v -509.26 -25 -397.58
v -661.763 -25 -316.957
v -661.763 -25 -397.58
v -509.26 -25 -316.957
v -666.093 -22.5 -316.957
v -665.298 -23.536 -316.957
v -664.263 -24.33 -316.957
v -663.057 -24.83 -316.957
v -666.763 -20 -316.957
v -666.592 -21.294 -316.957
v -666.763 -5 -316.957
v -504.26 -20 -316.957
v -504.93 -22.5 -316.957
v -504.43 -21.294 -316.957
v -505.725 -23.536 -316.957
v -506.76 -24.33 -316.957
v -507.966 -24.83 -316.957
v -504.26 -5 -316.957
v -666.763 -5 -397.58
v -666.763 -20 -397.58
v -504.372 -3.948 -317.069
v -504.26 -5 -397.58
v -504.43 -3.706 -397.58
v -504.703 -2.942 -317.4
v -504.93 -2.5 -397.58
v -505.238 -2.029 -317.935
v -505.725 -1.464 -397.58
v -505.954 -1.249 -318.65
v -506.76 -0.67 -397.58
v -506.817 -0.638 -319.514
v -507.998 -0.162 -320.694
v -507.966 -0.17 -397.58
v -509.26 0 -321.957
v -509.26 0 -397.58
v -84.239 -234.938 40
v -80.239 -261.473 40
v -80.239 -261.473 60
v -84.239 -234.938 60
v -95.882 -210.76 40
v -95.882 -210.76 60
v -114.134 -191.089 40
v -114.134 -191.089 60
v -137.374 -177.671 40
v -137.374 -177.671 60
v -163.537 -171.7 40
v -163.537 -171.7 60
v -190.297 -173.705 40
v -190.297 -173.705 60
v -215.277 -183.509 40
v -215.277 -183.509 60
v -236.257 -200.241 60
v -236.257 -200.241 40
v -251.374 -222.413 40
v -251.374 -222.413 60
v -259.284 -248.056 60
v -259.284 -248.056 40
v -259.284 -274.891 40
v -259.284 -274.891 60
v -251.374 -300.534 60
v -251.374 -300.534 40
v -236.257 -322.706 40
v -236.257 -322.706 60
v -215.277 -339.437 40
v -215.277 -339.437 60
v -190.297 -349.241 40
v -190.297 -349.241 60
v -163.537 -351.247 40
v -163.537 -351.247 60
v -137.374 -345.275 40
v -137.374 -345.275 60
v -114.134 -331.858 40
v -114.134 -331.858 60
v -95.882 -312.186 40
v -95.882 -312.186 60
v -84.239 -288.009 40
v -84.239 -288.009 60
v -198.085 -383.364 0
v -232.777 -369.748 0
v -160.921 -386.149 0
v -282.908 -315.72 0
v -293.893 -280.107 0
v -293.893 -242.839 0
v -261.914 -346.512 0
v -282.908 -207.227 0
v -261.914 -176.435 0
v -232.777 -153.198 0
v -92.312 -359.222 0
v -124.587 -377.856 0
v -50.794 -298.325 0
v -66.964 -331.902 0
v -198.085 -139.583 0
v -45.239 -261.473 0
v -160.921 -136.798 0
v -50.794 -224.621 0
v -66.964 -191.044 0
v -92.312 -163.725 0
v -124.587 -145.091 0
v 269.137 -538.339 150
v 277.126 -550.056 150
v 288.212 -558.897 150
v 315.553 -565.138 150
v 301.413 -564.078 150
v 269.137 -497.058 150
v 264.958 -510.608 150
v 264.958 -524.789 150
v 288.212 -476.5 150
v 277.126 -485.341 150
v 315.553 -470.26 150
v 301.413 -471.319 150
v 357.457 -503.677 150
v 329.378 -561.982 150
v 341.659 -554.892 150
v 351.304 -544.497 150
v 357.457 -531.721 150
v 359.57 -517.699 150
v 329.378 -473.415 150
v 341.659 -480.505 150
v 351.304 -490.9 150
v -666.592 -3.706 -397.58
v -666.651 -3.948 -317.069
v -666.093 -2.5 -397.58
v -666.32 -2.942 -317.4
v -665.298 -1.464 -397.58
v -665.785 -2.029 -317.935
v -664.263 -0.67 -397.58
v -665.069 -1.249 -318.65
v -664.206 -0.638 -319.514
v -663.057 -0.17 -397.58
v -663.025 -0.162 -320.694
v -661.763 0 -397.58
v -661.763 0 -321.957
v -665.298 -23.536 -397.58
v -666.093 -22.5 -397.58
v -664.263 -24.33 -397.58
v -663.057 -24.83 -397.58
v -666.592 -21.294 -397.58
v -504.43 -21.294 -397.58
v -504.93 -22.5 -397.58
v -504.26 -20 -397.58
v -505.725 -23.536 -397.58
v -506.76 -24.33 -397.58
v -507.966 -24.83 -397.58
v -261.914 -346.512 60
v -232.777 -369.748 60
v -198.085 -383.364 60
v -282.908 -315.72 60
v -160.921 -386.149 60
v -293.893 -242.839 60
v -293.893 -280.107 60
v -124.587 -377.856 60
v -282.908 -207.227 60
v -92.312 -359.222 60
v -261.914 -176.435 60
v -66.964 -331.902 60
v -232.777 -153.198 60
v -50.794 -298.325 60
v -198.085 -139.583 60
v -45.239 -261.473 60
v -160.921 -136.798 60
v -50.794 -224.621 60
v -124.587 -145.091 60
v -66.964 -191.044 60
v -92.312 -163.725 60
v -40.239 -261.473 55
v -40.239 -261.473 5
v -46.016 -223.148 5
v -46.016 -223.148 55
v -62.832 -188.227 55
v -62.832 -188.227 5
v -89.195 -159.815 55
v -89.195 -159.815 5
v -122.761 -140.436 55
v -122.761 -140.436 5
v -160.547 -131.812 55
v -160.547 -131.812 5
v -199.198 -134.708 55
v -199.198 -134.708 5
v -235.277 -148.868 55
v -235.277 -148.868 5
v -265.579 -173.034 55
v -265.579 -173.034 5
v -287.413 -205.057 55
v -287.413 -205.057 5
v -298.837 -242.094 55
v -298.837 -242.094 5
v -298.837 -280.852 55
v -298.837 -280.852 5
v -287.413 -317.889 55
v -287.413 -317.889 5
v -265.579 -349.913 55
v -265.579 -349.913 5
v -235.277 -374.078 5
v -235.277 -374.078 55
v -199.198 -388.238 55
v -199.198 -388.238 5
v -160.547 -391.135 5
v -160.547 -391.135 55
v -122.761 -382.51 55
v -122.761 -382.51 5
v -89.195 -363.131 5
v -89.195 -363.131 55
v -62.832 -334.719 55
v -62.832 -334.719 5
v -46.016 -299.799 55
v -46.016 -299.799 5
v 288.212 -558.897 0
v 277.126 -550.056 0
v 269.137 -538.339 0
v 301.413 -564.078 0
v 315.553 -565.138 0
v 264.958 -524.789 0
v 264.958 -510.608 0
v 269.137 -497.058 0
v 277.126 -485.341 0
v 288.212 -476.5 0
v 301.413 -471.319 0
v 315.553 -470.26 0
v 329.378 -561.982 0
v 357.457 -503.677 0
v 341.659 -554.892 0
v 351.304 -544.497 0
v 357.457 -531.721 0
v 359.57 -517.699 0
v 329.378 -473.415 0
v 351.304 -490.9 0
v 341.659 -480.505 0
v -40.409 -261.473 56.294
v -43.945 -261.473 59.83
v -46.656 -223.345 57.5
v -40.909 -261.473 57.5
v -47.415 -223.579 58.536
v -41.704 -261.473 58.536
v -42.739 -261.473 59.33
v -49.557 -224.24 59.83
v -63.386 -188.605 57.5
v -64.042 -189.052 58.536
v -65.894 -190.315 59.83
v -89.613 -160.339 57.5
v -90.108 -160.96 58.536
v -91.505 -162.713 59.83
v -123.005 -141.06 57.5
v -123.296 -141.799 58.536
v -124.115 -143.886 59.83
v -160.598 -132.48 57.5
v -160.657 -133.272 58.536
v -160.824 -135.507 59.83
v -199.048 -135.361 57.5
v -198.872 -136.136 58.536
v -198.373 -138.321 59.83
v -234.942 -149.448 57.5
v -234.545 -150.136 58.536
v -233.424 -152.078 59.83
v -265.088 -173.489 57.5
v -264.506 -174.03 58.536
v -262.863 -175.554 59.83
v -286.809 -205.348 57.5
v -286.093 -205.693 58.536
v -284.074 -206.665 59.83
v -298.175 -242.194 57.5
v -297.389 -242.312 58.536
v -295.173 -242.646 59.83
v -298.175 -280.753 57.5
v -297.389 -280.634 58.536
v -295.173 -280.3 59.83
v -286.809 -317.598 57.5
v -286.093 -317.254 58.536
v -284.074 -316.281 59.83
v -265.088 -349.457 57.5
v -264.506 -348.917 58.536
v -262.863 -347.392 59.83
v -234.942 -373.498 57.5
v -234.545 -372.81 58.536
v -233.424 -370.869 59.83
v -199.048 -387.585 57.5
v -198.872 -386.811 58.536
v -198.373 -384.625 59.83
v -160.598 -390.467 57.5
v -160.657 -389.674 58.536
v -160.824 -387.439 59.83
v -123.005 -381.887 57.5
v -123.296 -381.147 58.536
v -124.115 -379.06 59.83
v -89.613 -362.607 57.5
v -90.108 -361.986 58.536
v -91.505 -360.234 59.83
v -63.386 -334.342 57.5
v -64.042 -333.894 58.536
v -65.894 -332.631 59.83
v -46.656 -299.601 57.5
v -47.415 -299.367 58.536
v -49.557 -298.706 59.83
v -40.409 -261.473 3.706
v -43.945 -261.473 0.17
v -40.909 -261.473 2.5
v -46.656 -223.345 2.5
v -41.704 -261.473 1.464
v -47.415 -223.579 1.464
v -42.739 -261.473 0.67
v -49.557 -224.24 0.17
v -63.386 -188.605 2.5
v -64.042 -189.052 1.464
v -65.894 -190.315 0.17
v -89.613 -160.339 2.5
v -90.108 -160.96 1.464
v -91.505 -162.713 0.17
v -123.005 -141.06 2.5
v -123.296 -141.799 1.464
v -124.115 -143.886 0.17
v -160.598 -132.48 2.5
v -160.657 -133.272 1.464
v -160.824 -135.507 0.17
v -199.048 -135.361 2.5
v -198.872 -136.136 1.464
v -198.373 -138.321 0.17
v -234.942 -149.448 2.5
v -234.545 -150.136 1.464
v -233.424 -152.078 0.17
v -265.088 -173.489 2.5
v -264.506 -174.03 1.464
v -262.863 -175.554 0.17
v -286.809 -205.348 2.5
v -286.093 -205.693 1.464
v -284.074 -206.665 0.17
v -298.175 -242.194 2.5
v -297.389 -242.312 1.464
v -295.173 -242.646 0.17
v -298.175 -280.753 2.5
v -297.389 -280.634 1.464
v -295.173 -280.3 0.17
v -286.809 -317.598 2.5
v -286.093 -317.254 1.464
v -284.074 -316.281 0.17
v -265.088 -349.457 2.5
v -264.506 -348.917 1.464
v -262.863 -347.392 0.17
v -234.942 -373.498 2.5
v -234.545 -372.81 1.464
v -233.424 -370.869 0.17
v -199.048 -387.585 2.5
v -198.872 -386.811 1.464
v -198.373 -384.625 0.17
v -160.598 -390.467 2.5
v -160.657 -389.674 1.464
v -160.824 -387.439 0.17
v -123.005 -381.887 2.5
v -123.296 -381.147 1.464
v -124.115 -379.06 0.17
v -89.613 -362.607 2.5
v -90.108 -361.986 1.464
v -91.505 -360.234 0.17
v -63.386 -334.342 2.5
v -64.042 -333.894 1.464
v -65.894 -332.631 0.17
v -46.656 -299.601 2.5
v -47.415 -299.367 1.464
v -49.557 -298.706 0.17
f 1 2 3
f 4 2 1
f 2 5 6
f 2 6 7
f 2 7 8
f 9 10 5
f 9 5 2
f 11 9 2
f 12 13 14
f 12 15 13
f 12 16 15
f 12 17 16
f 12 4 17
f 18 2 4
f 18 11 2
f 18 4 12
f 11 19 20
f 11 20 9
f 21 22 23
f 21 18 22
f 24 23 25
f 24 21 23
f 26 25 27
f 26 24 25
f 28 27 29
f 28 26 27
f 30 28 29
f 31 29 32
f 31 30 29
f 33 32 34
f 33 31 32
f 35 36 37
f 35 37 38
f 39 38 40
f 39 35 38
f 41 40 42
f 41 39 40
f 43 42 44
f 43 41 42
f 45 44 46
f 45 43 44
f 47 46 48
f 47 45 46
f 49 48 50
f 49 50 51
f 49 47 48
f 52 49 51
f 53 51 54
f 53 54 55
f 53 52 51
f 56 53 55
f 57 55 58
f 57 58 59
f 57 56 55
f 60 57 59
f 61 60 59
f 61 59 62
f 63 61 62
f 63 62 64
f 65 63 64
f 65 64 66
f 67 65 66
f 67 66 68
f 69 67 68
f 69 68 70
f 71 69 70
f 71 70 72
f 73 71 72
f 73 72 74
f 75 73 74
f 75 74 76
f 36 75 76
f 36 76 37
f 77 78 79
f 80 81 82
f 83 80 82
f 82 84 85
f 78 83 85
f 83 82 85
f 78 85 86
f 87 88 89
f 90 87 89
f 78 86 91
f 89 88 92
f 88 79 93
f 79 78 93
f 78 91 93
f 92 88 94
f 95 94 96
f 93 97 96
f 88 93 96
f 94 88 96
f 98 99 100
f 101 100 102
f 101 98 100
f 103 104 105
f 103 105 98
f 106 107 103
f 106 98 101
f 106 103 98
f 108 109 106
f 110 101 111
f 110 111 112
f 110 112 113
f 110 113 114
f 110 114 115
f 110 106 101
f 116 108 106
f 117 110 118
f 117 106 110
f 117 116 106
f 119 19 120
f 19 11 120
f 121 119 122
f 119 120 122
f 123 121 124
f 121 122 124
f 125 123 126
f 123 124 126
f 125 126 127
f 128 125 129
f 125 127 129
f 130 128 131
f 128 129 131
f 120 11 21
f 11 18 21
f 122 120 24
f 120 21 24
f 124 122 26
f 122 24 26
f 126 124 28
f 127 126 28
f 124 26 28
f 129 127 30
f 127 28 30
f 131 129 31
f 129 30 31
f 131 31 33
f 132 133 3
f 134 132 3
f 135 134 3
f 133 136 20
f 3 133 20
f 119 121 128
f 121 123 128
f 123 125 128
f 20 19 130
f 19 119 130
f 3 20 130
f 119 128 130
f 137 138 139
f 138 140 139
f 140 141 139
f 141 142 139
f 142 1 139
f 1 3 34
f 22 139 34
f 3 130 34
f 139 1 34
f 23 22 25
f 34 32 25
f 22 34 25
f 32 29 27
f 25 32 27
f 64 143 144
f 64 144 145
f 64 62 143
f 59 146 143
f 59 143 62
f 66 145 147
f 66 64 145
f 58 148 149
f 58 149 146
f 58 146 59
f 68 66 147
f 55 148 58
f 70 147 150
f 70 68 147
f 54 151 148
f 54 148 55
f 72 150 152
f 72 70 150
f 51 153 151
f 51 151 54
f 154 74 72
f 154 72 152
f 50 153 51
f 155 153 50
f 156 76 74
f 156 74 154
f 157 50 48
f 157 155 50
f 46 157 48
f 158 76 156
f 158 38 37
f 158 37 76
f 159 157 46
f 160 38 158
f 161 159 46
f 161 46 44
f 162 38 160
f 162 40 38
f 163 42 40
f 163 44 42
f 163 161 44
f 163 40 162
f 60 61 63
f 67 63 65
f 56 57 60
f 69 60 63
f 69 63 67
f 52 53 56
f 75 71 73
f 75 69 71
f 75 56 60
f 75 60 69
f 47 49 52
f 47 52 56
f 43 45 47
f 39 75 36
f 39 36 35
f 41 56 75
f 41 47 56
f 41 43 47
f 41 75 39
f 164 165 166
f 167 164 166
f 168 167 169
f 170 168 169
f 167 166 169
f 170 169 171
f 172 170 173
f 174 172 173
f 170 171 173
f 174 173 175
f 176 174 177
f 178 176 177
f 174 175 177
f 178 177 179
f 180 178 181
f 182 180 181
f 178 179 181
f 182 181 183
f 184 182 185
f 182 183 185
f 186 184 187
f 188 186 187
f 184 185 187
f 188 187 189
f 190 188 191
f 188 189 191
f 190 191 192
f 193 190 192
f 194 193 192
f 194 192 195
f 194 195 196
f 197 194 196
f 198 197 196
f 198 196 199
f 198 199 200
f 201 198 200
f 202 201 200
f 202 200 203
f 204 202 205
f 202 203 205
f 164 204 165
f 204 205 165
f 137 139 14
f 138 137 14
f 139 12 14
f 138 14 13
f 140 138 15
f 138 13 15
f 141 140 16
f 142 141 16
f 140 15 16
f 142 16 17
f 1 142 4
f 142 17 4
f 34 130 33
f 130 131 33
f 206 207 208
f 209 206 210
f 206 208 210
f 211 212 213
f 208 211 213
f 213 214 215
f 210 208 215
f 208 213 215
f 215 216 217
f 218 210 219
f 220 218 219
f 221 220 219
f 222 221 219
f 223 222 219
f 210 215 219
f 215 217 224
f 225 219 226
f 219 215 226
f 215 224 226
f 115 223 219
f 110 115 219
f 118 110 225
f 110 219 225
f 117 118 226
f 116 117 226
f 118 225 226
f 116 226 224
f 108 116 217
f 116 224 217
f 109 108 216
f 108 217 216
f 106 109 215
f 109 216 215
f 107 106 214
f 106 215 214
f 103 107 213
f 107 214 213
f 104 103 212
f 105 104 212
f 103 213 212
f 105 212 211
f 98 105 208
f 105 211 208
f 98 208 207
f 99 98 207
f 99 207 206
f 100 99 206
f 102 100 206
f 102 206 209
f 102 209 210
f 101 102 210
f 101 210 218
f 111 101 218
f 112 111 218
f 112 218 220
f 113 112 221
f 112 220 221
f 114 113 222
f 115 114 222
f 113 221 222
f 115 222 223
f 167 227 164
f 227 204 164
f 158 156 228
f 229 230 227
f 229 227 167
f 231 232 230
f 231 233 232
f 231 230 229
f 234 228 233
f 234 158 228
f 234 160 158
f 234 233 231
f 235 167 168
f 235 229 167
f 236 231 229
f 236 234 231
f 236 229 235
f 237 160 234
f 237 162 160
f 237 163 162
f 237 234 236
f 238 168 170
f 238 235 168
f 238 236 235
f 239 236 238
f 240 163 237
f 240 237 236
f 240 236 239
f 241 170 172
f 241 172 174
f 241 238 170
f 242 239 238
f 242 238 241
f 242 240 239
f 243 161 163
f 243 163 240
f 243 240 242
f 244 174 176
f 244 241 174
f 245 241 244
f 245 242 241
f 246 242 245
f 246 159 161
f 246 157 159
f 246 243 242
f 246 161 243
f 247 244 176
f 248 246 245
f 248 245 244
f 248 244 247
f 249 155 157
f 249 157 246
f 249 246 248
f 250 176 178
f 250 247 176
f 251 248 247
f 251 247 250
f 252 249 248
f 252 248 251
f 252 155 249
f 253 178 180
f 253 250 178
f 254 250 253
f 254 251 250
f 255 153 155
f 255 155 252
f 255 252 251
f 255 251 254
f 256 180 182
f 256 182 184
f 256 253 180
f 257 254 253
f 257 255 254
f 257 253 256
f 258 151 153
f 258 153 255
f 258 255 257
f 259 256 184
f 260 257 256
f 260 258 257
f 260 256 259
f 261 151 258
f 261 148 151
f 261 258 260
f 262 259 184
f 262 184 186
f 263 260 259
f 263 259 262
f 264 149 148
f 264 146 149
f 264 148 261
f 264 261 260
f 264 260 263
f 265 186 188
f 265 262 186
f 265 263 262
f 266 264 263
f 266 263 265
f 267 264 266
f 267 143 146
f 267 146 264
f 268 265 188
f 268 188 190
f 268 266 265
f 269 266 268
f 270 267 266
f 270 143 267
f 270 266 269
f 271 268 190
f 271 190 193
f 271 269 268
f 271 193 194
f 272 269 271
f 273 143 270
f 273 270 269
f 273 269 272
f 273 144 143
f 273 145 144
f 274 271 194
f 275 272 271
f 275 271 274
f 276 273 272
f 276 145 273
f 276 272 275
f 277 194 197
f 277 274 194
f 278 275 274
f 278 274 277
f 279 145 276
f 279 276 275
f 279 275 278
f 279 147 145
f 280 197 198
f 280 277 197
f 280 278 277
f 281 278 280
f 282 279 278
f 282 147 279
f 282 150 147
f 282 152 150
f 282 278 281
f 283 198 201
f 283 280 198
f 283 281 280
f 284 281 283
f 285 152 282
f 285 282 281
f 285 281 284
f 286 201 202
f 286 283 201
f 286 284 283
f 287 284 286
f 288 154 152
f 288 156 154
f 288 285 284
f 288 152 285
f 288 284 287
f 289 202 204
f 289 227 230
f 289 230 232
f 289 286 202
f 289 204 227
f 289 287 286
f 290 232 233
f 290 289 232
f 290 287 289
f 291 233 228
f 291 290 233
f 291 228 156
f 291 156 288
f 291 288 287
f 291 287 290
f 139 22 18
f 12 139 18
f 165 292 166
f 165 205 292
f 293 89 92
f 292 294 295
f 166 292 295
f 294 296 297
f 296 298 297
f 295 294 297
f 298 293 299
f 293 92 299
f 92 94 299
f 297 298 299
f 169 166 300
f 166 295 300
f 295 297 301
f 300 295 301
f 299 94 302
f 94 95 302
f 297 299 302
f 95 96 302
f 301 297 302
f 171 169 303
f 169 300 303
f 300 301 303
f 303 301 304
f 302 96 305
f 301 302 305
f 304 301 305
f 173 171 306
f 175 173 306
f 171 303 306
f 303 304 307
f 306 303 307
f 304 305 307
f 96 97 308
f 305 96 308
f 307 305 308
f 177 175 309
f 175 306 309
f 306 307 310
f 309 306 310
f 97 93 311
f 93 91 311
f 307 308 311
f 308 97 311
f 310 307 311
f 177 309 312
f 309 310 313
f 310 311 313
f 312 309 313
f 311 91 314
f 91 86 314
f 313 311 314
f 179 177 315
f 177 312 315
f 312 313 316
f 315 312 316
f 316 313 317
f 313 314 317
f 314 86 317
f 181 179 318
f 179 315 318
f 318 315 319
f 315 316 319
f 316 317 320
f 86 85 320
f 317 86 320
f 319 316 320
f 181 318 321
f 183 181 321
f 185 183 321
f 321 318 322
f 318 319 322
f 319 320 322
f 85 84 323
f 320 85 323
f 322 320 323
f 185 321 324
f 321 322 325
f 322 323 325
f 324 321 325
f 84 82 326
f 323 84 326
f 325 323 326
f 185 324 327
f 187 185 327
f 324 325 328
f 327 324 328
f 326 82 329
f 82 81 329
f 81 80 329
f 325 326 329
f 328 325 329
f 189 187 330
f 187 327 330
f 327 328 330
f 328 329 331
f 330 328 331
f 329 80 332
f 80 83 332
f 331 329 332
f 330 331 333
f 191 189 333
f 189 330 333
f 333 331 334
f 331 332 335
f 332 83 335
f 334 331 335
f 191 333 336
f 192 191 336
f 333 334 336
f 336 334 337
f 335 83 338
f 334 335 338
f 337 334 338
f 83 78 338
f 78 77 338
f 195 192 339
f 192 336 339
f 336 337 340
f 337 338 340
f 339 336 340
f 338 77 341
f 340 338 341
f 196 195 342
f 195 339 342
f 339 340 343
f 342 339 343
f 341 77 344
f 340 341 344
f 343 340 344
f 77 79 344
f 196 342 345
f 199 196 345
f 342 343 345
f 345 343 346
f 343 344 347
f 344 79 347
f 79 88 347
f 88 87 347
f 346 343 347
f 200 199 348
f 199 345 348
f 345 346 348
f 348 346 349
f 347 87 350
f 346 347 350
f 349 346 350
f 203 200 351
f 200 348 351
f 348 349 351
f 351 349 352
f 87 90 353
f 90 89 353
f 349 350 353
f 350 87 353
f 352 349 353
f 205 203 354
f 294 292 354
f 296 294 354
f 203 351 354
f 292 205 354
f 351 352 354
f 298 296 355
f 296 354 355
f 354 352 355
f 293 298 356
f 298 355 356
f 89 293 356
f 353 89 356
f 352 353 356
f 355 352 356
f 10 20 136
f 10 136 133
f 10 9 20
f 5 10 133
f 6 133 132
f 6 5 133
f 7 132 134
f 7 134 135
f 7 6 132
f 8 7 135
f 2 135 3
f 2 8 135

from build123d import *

# Parameters (mm, degrees)
F0_R     = 130.025123
F1_DEPTH = 60
F2_T     = -40
F3_R     = 5
F4_R     = 47.57201
F5_DEPTH = 150
F6_W     = 162.502587
F6_H     = 80.623209
F7_DEPTH = 25
F8_R     = 5
F8_2_R   = 5


with BuildPart() as f1:
    # F0 (on Top) → F1 (new body)
    with BuildSketch(Plane.XY):
        with Locations((-170.264244, -261.473209)):
            Circle(F0_R)
    extrude(amount=F1_DEPTH)

    # F2
    f2_openings = [f1.faces().sort_by_distance(p)[0] for p in [
        (-170.264244, -261.473209, 60),
    ]]
    offset(amount=F2_T, openings=f2_openings)

    # F3
    f3_edges = [f1.edges().sort_by_distance(p)[0] for p in [
        (-300.289367, -261.473209, 60),
    ]]
    fillet(f3_edges, radius=F3_R)

    # F8#2
    f8_2_edges = [f1.edges().sort_by_distance(p)[0] for p in [
        (-300.289367, -261.473209, 0),
    ]]
    fillet(f8_2_edges, radius=F8_2_R)


with BuildPart() as f5:
    # F4 (on Top) → F5 (new body)
    with BuildSketch(Plane.XY):
        with Locations((311.998397, -517.698646)):
            Circle(F4_R)
    extrude(amount=F5_DEPTH)


with BuildPart() as f7:
    # F6 (on Front) → F7 (new body)
    with BuildSketch(Plane.XZ):
        with Locations((-585.511416, -357.268483)):
            Rectangle(F6_W, F6_H)
    extrude(amount=F7_DEPTH)

    # F8
    f8_edges = [f7.edges().sort_by_distance(p)[0] for p in [
        (-585.511416, 0, -316.956878),
        (-666.76271, -25, -357.268482),
        (-504.260123, -25, -357.268482),
        (-666.76271, 0, -357.268482),
        (-504.260123, 0, -357.268482),
    ]]
    fillet(f8_edges, radius=F8_R)


solid = Compound([f1.part, f5.part, f7.part])
